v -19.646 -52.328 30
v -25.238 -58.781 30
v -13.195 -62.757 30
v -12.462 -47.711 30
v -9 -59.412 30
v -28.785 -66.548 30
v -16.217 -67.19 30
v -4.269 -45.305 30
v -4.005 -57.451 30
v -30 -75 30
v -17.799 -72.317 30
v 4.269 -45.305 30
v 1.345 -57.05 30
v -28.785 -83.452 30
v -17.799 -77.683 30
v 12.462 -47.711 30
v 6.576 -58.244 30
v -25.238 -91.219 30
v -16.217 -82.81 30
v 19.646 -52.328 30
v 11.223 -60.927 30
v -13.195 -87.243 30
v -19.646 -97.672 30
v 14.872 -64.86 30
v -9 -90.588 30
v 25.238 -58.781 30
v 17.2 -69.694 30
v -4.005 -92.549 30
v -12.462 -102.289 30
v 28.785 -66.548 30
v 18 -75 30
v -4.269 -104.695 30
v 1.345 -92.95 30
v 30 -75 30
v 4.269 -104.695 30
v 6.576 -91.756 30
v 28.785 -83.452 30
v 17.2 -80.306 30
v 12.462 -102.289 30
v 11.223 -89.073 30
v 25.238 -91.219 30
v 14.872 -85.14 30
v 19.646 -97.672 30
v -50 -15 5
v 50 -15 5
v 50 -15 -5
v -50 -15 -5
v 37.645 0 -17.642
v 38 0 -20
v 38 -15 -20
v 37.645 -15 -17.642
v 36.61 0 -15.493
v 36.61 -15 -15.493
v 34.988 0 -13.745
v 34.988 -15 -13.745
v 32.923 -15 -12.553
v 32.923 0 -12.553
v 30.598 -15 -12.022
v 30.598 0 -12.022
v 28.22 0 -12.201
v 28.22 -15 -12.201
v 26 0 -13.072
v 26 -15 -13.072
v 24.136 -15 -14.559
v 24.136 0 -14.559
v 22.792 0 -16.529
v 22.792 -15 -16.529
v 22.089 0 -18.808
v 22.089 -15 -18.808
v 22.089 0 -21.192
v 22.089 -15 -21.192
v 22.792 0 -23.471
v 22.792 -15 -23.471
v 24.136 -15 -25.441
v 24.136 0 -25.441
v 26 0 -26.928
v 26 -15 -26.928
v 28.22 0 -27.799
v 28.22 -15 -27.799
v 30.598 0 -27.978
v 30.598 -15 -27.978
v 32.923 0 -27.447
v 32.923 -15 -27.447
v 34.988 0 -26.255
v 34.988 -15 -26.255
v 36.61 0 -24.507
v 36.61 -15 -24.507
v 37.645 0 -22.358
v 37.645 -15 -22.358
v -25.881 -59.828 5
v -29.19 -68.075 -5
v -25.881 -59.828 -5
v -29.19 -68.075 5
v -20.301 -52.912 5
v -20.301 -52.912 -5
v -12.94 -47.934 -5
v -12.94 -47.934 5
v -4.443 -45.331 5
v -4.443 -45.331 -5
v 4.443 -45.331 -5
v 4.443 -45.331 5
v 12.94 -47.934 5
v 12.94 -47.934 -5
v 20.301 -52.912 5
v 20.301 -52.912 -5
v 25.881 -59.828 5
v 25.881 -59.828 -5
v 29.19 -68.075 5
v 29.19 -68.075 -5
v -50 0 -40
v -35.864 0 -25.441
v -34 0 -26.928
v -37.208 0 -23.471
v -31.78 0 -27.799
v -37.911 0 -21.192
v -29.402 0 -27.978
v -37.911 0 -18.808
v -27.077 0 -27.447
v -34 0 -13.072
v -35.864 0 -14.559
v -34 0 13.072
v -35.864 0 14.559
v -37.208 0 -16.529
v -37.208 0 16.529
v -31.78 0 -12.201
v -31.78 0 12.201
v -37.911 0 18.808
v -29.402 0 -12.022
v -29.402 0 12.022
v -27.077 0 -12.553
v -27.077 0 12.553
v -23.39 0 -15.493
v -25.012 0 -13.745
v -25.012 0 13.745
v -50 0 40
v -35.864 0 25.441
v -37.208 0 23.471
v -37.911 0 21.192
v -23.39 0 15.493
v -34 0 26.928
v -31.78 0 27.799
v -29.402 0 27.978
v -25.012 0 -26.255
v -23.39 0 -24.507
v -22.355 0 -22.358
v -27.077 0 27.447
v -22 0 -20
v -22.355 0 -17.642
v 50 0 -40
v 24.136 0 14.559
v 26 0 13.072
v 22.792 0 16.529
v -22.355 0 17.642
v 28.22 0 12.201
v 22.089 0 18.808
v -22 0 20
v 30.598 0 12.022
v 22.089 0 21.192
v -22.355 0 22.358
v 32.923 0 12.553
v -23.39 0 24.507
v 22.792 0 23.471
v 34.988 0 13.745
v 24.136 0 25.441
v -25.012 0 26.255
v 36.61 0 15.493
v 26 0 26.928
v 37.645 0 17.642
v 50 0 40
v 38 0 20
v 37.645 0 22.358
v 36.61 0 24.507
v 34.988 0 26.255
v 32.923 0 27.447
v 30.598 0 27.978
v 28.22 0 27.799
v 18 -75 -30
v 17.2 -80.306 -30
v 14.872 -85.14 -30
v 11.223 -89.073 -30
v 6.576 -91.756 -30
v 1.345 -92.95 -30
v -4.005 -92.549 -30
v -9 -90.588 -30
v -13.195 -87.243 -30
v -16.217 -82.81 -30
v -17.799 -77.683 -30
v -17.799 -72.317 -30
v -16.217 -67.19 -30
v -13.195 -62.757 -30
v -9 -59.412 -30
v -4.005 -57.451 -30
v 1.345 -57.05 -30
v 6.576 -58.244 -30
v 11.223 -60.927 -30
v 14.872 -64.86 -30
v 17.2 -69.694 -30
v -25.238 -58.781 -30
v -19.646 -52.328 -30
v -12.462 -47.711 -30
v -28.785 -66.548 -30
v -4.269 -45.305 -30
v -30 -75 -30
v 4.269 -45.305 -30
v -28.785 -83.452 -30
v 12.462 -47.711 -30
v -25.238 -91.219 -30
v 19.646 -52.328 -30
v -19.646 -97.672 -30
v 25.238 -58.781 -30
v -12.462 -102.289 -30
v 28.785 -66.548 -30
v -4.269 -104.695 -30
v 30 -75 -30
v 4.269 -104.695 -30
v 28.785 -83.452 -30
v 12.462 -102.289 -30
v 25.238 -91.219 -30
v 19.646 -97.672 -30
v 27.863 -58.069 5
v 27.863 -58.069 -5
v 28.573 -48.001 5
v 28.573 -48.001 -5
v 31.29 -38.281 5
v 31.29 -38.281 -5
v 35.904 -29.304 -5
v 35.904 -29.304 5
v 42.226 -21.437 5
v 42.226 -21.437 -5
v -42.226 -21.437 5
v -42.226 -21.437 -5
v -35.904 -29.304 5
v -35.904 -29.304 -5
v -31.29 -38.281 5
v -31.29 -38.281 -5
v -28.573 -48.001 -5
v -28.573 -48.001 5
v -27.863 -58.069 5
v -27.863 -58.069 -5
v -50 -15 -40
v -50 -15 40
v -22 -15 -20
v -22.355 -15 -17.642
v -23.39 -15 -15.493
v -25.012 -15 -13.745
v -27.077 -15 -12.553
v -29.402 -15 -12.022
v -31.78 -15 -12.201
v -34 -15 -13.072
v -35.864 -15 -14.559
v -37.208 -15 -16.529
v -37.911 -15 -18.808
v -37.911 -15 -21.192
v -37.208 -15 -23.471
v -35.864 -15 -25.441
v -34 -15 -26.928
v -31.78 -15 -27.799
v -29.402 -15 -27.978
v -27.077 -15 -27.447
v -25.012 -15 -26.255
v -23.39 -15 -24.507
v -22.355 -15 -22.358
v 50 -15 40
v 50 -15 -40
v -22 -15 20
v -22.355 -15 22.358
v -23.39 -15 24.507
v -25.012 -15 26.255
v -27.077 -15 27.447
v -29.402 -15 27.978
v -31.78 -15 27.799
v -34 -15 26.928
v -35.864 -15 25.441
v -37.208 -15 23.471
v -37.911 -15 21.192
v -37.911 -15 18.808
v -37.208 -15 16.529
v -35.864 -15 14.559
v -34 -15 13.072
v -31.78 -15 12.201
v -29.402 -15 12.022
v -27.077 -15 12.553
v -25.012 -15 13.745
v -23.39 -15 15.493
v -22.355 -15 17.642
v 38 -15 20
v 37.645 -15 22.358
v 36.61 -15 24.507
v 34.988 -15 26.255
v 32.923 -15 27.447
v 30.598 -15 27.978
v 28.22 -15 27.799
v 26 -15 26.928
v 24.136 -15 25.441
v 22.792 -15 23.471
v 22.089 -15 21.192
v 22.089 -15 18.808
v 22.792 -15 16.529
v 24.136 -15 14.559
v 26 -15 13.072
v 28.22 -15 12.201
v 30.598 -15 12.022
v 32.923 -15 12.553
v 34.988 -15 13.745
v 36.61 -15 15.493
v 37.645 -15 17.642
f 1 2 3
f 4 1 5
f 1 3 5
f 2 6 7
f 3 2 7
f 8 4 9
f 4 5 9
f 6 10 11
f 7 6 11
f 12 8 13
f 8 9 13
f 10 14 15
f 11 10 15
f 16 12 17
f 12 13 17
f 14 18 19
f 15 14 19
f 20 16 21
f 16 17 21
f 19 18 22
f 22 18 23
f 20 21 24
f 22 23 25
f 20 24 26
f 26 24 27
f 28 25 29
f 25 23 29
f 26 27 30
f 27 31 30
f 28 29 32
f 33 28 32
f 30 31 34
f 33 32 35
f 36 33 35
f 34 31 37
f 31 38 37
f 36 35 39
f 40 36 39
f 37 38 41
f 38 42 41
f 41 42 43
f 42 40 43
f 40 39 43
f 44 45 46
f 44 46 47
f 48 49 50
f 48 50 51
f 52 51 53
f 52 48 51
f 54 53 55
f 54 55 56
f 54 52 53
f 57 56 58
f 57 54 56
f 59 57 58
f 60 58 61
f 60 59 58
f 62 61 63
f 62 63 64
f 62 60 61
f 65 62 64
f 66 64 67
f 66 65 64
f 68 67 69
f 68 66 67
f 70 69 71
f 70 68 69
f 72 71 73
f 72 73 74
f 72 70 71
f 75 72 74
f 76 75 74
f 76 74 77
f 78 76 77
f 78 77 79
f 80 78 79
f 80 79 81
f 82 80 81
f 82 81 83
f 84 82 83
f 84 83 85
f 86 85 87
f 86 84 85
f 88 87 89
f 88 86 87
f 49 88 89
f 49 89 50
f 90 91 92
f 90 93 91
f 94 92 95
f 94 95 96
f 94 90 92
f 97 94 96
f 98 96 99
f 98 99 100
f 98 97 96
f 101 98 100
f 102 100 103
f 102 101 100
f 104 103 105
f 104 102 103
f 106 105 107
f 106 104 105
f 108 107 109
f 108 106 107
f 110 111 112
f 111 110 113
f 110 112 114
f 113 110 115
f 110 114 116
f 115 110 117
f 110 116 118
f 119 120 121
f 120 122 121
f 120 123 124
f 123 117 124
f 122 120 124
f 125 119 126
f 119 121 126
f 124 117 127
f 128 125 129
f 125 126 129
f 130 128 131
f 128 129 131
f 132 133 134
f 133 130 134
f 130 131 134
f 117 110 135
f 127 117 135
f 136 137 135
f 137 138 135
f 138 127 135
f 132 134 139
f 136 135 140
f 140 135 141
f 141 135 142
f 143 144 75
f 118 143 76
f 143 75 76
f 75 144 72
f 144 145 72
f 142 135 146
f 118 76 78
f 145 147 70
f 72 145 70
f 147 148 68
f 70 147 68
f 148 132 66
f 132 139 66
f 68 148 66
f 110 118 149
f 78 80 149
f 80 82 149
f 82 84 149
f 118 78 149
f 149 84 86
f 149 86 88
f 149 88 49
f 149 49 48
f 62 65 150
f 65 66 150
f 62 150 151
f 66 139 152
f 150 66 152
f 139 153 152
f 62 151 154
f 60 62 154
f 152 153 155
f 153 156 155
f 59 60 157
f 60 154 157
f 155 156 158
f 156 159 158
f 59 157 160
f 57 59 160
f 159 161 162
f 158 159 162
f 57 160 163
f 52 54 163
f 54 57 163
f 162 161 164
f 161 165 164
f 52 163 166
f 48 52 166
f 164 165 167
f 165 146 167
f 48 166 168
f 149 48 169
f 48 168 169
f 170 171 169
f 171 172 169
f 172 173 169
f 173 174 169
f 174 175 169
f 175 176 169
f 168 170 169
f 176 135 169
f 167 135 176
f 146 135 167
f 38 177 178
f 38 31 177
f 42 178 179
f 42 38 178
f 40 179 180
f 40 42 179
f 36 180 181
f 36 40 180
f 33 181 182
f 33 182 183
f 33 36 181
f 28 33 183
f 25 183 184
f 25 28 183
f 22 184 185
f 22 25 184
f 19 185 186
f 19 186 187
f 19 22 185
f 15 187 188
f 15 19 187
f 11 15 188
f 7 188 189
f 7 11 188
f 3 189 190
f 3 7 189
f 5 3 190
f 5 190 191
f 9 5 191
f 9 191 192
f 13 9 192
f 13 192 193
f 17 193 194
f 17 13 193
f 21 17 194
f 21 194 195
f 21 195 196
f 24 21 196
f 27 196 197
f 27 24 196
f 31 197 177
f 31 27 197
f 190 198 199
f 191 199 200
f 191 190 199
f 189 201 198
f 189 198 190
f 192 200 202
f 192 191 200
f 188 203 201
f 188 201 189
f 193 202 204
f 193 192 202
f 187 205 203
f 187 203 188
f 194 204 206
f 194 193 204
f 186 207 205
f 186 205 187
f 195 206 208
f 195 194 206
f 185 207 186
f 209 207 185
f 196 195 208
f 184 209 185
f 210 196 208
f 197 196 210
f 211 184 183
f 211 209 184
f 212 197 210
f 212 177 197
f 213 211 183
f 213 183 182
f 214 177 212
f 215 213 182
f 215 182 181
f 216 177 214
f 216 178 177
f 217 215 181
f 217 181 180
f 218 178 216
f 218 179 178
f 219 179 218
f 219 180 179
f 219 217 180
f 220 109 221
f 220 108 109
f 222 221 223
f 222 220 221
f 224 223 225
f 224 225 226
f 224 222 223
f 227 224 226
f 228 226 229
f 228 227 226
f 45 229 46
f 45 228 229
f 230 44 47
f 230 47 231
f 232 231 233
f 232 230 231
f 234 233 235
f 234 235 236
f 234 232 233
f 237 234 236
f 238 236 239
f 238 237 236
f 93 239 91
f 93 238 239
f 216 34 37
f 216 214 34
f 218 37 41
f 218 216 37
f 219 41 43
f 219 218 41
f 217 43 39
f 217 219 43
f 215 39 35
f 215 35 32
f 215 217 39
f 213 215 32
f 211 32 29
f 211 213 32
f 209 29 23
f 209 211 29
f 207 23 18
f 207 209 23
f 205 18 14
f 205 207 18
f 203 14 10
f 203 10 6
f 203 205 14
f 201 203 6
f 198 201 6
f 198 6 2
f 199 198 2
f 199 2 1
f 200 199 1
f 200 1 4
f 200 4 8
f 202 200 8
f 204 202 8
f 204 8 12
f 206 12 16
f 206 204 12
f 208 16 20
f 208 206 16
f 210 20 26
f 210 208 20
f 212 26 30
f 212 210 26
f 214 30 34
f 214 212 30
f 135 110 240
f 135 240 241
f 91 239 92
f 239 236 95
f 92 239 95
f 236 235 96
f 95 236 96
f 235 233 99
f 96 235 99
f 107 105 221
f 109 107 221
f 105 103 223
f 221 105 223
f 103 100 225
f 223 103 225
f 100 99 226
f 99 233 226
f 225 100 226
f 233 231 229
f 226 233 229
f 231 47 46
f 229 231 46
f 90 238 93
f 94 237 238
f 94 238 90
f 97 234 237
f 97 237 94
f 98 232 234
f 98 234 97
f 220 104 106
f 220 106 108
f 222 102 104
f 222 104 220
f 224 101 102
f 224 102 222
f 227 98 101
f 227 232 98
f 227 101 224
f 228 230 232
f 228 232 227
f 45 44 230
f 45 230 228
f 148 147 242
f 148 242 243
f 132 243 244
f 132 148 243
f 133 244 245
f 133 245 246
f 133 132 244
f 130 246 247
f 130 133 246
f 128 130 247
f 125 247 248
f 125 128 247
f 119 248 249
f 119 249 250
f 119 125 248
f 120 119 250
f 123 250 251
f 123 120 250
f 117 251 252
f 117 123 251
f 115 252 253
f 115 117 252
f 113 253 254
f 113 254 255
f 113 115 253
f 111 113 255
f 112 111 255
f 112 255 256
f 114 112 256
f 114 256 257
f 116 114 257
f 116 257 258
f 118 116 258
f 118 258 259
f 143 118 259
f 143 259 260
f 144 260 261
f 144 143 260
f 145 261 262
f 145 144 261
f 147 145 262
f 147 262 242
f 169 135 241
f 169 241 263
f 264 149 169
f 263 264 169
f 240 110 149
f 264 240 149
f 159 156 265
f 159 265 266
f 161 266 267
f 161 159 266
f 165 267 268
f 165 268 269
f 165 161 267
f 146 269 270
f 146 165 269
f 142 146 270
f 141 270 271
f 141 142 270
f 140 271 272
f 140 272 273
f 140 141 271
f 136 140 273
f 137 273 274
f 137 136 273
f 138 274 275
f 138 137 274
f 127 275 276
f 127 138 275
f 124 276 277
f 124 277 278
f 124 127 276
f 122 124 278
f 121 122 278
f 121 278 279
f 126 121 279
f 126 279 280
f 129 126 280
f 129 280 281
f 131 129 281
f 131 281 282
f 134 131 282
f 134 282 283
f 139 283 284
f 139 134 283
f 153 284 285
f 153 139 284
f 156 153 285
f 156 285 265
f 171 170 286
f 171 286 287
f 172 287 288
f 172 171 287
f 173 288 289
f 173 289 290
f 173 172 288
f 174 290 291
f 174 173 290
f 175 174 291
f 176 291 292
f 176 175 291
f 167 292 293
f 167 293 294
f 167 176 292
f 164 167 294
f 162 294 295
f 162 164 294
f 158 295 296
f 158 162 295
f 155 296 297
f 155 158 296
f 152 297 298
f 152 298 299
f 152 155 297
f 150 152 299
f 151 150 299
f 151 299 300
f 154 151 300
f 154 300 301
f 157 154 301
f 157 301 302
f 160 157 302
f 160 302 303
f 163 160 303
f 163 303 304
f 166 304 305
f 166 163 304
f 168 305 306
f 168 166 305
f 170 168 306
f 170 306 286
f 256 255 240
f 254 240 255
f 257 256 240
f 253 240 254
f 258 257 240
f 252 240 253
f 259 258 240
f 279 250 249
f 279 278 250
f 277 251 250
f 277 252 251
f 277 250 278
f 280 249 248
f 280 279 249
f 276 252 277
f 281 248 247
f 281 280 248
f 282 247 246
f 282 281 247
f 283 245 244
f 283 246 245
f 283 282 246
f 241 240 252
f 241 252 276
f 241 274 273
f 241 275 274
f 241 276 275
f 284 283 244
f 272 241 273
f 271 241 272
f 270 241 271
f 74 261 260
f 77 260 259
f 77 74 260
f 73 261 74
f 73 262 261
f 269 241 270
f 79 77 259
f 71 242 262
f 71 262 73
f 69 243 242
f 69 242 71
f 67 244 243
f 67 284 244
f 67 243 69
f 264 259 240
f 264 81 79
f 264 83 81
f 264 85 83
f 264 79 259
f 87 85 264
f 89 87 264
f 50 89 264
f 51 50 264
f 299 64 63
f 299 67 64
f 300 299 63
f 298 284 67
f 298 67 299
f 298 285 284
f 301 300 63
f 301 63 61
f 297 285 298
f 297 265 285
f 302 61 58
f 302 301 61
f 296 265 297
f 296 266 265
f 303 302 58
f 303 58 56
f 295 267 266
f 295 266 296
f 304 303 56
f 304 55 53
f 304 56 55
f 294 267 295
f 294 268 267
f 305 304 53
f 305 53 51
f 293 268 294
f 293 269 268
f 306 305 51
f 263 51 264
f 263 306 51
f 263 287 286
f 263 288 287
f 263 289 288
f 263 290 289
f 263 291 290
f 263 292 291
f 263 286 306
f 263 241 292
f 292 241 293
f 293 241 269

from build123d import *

# Parameters (mm, degrees)
F0_W     = 100
F0_H     = 80
F0_R     = 8
F1_DEPTH = 15
F3_R     = 30
F3_R_2   = 18
F4_DEPTH = 30
F6_DEPTH = 5


# Not quite as in the source:
# - a feature of the source that left no trace in its solid (it failed there, or was rolled back) is left out


with BuildPart() as f1:
    # F0 (on Front) → F1 (new body)
    with BuildSketch(Plane.XZ):
        Rectangle(F0_W, F0_H)
        with Locations((-30, -20)):
            Circle(F0_R, mode=Mode.SUBTRACT)
        with Locations((30, -20)):
            Circle(F0_R, mode=Mode.SUBTRACT)
        with Locations((-30, 20)):
            Circle(F0_R, mode=Mode.SUBTRACT)
        with Locations((30, 20)):
            Circle(F0_R, mode=Mode.SUBTRACT)
    extrude(amount=F1_DEPTH)


with BuildPart() as f4:
    # F3 (on offset) → F4 (new body, symmetric)
    with BuildSketch(Plane(origin=(0, 0, 0), x_dir=(1, 0, 0), z_dir=(0, 0, -1))):
        with Locations((0, 75)):
            Circle(F3_R)
        with Locations((0, 75)):
            Circle(F3_R_2, mode=Mode.SUBTRACT)
    extrude(amount=F4_DEPTH, both=True)


with BuildPart() as f6:
    # F5 (on Top) → F6 (new body, symmetric)
    with BuildSketch(Plane.XY):
        with BuildLine():
            ThreePointArc((29.1897496686, -68.0747913905), (31.2896610375, -38.2809801044), (50, -15))
            Line((50, -15), (-50, -15))
            ThreePointArc((-50, -15), (-31.2896610375, -38.2809801044), (-29.1897496686, -68.0747913905))
            ThreePointArc((-29.1897496686, -68.0747913905), (0, -45), (29.1897496686, -68.0747913905))
        make_face()
    extrude(amount=F6_DEPTH, both=True)


solid = Compound([f1.part, f4.part, f6.part])
